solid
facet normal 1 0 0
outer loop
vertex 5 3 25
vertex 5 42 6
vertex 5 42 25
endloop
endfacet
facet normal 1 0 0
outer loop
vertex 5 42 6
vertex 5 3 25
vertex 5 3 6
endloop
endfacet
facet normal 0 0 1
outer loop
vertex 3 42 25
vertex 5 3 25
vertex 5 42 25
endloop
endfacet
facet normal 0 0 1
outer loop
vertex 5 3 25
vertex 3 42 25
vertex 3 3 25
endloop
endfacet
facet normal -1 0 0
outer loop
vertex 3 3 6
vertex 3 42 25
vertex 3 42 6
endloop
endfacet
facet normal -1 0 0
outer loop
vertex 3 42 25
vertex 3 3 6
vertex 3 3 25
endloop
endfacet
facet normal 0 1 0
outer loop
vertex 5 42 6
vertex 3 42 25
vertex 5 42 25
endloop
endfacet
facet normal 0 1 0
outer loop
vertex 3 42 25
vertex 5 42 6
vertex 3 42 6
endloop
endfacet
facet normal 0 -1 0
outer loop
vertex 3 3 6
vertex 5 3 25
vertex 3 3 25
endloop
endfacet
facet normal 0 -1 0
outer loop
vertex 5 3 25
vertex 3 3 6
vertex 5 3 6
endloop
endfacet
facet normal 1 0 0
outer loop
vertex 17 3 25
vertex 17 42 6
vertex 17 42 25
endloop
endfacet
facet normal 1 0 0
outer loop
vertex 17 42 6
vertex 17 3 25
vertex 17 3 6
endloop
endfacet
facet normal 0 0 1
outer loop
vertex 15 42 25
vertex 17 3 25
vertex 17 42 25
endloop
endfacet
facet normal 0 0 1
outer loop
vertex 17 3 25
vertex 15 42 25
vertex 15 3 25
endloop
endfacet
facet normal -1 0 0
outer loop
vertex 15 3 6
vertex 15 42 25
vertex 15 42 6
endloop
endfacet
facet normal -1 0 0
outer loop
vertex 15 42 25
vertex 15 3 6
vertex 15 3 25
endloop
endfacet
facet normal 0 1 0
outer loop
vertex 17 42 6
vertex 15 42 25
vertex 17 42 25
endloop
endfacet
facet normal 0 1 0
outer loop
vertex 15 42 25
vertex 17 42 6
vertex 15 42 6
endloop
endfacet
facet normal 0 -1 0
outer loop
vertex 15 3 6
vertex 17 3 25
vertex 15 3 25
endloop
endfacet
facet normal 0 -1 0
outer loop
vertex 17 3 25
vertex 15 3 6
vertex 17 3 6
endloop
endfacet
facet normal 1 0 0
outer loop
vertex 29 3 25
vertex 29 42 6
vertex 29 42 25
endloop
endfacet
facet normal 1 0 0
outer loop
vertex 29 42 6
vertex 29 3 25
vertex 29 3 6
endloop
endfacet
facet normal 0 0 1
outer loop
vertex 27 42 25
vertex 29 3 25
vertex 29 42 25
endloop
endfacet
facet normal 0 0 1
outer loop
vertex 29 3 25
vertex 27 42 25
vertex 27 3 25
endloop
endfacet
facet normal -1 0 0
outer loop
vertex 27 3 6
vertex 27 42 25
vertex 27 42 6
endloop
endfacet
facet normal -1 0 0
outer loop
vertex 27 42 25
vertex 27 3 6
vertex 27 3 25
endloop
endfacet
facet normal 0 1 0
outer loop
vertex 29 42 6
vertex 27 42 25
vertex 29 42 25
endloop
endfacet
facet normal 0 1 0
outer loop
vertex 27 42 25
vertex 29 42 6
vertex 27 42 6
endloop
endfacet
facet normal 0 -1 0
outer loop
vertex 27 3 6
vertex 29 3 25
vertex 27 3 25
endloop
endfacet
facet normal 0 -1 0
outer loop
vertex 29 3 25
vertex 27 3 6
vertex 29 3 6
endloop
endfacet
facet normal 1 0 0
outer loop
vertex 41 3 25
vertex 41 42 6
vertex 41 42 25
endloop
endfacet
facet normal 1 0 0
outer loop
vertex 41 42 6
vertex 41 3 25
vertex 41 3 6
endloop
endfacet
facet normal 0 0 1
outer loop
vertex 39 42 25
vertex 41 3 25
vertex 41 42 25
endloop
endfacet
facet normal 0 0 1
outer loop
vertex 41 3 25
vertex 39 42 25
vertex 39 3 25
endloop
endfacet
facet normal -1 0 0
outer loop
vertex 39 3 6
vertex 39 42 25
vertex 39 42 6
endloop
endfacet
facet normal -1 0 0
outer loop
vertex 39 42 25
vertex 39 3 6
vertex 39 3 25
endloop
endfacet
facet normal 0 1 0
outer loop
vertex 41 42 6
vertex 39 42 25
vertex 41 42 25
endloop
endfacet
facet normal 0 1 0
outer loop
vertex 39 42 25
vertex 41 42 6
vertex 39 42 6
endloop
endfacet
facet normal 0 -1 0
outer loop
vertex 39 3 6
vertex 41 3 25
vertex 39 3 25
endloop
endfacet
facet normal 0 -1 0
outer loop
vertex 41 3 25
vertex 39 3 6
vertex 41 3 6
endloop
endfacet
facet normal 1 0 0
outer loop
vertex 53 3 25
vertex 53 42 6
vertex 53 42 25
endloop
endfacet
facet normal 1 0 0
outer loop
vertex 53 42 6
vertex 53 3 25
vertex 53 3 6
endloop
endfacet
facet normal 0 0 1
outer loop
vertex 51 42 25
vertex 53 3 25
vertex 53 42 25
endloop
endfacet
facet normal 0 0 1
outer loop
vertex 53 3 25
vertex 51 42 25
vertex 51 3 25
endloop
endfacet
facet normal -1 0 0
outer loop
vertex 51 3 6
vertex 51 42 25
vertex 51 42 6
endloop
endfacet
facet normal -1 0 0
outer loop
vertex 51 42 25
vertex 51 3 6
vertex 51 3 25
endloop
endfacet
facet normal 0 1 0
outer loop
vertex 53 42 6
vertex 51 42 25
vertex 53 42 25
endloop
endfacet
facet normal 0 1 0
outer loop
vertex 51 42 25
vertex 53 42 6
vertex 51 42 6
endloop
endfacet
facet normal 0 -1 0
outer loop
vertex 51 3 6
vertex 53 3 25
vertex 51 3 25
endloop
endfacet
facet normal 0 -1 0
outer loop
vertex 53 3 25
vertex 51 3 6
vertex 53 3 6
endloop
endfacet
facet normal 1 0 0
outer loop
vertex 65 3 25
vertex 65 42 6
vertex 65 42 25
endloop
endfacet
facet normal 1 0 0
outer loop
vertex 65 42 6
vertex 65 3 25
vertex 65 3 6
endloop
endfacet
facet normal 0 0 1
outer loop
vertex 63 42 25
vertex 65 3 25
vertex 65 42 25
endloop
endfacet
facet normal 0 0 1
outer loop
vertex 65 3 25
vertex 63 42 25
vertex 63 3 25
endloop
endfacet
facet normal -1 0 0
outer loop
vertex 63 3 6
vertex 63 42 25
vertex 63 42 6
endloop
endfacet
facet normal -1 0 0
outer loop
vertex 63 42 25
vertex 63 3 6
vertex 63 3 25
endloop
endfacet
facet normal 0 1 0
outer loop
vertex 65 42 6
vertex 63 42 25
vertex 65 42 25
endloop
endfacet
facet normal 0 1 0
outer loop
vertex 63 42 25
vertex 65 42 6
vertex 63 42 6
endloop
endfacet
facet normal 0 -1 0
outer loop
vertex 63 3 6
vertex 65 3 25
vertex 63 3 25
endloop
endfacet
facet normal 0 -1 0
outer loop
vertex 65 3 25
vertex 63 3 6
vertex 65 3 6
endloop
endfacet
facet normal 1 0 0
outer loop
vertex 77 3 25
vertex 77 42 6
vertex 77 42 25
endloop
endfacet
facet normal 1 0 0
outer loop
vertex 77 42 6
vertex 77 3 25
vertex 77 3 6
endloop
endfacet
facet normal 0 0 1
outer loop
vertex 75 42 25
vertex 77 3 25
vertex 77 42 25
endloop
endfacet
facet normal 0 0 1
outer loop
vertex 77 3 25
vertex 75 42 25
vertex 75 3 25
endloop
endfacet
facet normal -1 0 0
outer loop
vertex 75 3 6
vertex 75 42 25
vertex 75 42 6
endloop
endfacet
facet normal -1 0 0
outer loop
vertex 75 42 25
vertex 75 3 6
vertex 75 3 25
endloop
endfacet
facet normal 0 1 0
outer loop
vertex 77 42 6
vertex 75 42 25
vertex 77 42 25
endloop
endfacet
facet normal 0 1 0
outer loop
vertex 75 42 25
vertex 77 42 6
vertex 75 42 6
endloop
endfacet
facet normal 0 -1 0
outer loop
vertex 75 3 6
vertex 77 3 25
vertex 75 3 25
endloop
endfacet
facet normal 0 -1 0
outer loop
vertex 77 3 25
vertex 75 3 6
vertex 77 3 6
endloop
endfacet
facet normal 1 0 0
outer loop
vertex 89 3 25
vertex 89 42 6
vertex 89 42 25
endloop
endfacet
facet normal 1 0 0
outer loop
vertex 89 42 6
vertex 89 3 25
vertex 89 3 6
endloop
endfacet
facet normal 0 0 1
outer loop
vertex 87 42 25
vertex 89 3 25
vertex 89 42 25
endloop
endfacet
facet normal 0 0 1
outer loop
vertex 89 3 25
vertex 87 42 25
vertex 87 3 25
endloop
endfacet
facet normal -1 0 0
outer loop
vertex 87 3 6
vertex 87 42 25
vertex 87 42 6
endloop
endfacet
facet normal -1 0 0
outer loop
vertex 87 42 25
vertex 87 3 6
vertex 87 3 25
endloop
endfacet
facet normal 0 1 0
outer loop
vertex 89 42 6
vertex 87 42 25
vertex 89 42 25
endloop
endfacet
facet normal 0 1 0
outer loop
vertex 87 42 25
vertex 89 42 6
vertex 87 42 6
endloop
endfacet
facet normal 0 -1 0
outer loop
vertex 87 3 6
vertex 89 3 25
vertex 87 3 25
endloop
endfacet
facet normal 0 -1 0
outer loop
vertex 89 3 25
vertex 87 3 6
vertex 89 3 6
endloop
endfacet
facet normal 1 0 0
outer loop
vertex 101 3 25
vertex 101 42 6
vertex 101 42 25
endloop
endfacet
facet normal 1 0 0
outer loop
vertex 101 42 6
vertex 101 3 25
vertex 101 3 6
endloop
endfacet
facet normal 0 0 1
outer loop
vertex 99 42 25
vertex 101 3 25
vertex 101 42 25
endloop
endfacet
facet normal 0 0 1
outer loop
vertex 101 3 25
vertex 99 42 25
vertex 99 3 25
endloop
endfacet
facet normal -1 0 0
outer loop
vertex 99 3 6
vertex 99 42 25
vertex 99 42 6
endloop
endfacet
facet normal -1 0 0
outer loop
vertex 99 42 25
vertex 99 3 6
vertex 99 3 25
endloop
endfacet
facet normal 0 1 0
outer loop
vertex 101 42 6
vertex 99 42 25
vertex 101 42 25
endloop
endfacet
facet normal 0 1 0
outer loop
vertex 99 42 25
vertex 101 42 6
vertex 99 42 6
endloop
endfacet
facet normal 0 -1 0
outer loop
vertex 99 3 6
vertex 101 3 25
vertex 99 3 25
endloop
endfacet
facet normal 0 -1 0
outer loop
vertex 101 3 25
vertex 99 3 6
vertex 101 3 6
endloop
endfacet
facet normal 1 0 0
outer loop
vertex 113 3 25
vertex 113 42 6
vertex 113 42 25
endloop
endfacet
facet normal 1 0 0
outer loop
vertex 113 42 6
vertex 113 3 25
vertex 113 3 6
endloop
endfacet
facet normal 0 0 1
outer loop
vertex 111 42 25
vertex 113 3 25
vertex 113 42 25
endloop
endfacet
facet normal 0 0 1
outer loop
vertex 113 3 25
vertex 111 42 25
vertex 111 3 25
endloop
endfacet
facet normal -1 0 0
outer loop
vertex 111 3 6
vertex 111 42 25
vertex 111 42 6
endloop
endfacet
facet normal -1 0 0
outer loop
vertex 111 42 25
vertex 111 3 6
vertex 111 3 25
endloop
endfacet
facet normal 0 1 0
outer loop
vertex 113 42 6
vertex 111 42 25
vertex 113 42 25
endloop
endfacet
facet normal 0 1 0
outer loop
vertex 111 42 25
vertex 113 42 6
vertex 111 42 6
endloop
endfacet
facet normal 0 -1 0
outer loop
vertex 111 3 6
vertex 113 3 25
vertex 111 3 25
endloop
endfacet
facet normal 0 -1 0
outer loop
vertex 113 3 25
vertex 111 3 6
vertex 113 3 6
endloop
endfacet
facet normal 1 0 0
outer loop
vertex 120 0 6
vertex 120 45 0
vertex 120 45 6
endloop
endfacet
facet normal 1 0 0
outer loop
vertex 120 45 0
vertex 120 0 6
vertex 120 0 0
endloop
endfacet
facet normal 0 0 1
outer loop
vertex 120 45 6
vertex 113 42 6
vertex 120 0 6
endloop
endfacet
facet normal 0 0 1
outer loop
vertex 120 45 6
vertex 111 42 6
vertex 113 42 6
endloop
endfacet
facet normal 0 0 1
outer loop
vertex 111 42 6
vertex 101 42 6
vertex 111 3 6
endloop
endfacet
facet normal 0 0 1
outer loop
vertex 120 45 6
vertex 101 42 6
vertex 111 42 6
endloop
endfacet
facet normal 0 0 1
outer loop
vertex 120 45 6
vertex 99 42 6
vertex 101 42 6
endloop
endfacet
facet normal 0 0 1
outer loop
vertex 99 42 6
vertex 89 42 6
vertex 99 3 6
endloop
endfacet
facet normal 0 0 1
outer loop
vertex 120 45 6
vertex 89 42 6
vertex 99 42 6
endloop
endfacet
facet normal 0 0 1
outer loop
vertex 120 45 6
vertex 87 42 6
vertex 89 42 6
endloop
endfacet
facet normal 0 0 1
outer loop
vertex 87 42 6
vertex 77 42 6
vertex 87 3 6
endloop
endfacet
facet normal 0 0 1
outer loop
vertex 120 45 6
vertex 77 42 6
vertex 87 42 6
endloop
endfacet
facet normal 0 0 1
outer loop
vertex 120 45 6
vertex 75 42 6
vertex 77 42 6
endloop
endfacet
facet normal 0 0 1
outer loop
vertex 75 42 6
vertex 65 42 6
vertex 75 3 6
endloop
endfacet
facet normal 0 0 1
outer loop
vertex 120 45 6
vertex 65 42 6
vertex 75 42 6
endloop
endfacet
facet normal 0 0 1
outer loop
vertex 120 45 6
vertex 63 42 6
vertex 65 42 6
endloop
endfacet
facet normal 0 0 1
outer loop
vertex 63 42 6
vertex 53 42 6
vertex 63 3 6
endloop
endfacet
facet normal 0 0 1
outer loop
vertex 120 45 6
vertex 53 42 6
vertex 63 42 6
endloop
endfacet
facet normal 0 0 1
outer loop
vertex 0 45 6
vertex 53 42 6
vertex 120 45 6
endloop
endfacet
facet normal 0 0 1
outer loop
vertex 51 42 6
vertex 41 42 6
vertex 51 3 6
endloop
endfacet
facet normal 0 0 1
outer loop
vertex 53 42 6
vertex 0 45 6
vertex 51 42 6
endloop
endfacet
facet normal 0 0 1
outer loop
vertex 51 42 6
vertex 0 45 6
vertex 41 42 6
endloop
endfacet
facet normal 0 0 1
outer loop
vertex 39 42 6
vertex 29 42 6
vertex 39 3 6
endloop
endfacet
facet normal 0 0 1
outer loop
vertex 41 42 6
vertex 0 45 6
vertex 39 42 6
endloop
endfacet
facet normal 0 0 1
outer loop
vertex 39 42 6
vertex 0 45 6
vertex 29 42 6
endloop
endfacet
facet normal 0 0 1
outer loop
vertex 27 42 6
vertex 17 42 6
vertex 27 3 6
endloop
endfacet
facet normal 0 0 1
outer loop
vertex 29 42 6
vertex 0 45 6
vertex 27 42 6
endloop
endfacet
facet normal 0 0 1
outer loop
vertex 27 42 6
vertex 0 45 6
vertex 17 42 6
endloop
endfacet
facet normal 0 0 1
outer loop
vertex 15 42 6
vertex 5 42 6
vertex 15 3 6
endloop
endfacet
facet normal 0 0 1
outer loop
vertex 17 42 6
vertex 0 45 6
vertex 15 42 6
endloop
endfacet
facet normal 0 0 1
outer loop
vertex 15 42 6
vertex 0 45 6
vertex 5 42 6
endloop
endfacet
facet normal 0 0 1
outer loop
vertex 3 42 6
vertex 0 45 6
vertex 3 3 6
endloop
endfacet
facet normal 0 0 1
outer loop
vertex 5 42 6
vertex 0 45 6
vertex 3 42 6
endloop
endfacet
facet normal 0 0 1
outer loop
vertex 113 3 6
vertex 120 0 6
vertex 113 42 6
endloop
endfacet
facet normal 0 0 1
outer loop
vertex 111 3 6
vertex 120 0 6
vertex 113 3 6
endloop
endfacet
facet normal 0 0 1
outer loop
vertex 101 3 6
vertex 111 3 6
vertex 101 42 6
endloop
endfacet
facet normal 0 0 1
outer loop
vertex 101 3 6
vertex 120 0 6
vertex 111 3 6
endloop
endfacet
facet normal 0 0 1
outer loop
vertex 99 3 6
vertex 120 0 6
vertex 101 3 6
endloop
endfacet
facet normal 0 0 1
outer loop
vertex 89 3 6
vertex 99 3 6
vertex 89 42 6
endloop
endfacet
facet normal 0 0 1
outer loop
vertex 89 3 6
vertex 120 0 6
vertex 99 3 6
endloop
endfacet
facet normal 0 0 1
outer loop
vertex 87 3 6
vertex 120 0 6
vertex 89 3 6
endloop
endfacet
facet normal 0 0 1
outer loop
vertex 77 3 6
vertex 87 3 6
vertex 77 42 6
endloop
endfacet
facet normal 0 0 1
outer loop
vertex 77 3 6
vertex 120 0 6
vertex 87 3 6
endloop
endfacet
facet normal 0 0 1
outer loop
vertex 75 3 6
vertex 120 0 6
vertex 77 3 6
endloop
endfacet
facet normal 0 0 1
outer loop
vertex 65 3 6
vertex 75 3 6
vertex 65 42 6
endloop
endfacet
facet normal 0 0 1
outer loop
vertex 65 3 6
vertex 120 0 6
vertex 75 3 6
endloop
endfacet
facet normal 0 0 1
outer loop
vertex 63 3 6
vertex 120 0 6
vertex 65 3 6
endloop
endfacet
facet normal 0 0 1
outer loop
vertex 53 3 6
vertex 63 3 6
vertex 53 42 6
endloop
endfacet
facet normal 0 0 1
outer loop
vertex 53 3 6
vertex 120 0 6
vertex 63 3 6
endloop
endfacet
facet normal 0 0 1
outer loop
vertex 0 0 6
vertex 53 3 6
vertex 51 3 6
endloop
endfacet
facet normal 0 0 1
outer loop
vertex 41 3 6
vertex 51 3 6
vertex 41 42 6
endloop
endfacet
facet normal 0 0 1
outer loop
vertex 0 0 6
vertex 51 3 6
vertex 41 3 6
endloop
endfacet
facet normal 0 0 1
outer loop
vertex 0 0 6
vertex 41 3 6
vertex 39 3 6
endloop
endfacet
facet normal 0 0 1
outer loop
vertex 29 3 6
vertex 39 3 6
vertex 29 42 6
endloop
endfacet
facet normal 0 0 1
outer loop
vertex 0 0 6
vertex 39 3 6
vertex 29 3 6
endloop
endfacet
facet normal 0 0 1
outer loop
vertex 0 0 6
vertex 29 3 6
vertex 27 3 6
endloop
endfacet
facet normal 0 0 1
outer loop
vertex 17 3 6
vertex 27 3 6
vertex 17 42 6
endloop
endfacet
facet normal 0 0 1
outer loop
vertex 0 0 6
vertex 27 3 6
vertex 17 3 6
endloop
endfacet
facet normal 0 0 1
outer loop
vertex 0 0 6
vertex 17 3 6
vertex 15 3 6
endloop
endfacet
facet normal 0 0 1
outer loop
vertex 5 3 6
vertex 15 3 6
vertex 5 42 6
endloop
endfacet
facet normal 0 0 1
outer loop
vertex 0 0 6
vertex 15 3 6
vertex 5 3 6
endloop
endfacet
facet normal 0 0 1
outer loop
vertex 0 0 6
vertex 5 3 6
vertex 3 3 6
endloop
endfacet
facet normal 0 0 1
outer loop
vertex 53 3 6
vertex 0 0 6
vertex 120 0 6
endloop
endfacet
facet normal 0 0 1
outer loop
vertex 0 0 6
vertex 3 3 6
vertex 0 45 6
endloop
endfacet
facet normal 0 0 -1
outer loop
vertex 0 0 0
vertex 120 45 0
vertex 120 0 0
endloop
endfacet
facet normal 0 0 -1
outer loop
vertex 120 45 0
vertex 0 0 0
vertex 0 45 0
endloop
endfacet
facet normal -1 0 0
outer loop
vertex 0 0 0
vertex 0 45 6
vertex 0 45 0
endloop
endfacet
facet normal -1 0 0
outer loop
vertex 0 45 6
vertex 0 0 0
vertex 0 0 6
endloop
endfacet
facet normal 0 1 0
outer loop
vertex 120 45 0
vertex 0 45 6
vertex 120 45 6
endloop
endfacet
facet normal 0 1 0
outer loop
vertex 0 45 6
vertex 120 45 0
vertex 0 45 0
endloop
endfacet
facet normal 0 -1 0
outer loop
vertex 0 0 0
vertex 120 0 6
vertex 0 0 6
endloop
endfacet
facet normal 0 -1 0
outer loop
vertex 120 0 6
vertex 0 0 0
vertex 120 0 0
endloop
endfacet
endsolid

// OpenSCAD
$fn = 32;

// ----------------------------------------------------------------------
// Heatsink: uniform fin block
// ----------------------------------------------------------------------

// --- parameters (mm) ---
base_l = 120;             // base length, X
base_w = 45;              // base width, Y
base_t = 6;               // base plate thickness
fin_h = 20;               // fin height above the base
fin_t = 2;                // fin thickness
edge = 3;                 // margin from the base ends
pitch = 12;               // fin pitch
fit_tol = 0.1;            // tolerance for press fits, mm
free_tol = 0.3;           // tolerance for clearance fits, mm

n_fins = floor((base_l - 2 * edge - fin_t) / pitch) + 1;  // fin count
total_h = base_t + fin_h - 1;  // overall height

union() {
  cube([base_l, base_w, base_t]);
  for (i = [0 : n_fins - 1])
    translate([edge + i * pitch, edge, base_t - 1])
      cube([fin_t, base_w - 2 * edge, fin_h]);
}
